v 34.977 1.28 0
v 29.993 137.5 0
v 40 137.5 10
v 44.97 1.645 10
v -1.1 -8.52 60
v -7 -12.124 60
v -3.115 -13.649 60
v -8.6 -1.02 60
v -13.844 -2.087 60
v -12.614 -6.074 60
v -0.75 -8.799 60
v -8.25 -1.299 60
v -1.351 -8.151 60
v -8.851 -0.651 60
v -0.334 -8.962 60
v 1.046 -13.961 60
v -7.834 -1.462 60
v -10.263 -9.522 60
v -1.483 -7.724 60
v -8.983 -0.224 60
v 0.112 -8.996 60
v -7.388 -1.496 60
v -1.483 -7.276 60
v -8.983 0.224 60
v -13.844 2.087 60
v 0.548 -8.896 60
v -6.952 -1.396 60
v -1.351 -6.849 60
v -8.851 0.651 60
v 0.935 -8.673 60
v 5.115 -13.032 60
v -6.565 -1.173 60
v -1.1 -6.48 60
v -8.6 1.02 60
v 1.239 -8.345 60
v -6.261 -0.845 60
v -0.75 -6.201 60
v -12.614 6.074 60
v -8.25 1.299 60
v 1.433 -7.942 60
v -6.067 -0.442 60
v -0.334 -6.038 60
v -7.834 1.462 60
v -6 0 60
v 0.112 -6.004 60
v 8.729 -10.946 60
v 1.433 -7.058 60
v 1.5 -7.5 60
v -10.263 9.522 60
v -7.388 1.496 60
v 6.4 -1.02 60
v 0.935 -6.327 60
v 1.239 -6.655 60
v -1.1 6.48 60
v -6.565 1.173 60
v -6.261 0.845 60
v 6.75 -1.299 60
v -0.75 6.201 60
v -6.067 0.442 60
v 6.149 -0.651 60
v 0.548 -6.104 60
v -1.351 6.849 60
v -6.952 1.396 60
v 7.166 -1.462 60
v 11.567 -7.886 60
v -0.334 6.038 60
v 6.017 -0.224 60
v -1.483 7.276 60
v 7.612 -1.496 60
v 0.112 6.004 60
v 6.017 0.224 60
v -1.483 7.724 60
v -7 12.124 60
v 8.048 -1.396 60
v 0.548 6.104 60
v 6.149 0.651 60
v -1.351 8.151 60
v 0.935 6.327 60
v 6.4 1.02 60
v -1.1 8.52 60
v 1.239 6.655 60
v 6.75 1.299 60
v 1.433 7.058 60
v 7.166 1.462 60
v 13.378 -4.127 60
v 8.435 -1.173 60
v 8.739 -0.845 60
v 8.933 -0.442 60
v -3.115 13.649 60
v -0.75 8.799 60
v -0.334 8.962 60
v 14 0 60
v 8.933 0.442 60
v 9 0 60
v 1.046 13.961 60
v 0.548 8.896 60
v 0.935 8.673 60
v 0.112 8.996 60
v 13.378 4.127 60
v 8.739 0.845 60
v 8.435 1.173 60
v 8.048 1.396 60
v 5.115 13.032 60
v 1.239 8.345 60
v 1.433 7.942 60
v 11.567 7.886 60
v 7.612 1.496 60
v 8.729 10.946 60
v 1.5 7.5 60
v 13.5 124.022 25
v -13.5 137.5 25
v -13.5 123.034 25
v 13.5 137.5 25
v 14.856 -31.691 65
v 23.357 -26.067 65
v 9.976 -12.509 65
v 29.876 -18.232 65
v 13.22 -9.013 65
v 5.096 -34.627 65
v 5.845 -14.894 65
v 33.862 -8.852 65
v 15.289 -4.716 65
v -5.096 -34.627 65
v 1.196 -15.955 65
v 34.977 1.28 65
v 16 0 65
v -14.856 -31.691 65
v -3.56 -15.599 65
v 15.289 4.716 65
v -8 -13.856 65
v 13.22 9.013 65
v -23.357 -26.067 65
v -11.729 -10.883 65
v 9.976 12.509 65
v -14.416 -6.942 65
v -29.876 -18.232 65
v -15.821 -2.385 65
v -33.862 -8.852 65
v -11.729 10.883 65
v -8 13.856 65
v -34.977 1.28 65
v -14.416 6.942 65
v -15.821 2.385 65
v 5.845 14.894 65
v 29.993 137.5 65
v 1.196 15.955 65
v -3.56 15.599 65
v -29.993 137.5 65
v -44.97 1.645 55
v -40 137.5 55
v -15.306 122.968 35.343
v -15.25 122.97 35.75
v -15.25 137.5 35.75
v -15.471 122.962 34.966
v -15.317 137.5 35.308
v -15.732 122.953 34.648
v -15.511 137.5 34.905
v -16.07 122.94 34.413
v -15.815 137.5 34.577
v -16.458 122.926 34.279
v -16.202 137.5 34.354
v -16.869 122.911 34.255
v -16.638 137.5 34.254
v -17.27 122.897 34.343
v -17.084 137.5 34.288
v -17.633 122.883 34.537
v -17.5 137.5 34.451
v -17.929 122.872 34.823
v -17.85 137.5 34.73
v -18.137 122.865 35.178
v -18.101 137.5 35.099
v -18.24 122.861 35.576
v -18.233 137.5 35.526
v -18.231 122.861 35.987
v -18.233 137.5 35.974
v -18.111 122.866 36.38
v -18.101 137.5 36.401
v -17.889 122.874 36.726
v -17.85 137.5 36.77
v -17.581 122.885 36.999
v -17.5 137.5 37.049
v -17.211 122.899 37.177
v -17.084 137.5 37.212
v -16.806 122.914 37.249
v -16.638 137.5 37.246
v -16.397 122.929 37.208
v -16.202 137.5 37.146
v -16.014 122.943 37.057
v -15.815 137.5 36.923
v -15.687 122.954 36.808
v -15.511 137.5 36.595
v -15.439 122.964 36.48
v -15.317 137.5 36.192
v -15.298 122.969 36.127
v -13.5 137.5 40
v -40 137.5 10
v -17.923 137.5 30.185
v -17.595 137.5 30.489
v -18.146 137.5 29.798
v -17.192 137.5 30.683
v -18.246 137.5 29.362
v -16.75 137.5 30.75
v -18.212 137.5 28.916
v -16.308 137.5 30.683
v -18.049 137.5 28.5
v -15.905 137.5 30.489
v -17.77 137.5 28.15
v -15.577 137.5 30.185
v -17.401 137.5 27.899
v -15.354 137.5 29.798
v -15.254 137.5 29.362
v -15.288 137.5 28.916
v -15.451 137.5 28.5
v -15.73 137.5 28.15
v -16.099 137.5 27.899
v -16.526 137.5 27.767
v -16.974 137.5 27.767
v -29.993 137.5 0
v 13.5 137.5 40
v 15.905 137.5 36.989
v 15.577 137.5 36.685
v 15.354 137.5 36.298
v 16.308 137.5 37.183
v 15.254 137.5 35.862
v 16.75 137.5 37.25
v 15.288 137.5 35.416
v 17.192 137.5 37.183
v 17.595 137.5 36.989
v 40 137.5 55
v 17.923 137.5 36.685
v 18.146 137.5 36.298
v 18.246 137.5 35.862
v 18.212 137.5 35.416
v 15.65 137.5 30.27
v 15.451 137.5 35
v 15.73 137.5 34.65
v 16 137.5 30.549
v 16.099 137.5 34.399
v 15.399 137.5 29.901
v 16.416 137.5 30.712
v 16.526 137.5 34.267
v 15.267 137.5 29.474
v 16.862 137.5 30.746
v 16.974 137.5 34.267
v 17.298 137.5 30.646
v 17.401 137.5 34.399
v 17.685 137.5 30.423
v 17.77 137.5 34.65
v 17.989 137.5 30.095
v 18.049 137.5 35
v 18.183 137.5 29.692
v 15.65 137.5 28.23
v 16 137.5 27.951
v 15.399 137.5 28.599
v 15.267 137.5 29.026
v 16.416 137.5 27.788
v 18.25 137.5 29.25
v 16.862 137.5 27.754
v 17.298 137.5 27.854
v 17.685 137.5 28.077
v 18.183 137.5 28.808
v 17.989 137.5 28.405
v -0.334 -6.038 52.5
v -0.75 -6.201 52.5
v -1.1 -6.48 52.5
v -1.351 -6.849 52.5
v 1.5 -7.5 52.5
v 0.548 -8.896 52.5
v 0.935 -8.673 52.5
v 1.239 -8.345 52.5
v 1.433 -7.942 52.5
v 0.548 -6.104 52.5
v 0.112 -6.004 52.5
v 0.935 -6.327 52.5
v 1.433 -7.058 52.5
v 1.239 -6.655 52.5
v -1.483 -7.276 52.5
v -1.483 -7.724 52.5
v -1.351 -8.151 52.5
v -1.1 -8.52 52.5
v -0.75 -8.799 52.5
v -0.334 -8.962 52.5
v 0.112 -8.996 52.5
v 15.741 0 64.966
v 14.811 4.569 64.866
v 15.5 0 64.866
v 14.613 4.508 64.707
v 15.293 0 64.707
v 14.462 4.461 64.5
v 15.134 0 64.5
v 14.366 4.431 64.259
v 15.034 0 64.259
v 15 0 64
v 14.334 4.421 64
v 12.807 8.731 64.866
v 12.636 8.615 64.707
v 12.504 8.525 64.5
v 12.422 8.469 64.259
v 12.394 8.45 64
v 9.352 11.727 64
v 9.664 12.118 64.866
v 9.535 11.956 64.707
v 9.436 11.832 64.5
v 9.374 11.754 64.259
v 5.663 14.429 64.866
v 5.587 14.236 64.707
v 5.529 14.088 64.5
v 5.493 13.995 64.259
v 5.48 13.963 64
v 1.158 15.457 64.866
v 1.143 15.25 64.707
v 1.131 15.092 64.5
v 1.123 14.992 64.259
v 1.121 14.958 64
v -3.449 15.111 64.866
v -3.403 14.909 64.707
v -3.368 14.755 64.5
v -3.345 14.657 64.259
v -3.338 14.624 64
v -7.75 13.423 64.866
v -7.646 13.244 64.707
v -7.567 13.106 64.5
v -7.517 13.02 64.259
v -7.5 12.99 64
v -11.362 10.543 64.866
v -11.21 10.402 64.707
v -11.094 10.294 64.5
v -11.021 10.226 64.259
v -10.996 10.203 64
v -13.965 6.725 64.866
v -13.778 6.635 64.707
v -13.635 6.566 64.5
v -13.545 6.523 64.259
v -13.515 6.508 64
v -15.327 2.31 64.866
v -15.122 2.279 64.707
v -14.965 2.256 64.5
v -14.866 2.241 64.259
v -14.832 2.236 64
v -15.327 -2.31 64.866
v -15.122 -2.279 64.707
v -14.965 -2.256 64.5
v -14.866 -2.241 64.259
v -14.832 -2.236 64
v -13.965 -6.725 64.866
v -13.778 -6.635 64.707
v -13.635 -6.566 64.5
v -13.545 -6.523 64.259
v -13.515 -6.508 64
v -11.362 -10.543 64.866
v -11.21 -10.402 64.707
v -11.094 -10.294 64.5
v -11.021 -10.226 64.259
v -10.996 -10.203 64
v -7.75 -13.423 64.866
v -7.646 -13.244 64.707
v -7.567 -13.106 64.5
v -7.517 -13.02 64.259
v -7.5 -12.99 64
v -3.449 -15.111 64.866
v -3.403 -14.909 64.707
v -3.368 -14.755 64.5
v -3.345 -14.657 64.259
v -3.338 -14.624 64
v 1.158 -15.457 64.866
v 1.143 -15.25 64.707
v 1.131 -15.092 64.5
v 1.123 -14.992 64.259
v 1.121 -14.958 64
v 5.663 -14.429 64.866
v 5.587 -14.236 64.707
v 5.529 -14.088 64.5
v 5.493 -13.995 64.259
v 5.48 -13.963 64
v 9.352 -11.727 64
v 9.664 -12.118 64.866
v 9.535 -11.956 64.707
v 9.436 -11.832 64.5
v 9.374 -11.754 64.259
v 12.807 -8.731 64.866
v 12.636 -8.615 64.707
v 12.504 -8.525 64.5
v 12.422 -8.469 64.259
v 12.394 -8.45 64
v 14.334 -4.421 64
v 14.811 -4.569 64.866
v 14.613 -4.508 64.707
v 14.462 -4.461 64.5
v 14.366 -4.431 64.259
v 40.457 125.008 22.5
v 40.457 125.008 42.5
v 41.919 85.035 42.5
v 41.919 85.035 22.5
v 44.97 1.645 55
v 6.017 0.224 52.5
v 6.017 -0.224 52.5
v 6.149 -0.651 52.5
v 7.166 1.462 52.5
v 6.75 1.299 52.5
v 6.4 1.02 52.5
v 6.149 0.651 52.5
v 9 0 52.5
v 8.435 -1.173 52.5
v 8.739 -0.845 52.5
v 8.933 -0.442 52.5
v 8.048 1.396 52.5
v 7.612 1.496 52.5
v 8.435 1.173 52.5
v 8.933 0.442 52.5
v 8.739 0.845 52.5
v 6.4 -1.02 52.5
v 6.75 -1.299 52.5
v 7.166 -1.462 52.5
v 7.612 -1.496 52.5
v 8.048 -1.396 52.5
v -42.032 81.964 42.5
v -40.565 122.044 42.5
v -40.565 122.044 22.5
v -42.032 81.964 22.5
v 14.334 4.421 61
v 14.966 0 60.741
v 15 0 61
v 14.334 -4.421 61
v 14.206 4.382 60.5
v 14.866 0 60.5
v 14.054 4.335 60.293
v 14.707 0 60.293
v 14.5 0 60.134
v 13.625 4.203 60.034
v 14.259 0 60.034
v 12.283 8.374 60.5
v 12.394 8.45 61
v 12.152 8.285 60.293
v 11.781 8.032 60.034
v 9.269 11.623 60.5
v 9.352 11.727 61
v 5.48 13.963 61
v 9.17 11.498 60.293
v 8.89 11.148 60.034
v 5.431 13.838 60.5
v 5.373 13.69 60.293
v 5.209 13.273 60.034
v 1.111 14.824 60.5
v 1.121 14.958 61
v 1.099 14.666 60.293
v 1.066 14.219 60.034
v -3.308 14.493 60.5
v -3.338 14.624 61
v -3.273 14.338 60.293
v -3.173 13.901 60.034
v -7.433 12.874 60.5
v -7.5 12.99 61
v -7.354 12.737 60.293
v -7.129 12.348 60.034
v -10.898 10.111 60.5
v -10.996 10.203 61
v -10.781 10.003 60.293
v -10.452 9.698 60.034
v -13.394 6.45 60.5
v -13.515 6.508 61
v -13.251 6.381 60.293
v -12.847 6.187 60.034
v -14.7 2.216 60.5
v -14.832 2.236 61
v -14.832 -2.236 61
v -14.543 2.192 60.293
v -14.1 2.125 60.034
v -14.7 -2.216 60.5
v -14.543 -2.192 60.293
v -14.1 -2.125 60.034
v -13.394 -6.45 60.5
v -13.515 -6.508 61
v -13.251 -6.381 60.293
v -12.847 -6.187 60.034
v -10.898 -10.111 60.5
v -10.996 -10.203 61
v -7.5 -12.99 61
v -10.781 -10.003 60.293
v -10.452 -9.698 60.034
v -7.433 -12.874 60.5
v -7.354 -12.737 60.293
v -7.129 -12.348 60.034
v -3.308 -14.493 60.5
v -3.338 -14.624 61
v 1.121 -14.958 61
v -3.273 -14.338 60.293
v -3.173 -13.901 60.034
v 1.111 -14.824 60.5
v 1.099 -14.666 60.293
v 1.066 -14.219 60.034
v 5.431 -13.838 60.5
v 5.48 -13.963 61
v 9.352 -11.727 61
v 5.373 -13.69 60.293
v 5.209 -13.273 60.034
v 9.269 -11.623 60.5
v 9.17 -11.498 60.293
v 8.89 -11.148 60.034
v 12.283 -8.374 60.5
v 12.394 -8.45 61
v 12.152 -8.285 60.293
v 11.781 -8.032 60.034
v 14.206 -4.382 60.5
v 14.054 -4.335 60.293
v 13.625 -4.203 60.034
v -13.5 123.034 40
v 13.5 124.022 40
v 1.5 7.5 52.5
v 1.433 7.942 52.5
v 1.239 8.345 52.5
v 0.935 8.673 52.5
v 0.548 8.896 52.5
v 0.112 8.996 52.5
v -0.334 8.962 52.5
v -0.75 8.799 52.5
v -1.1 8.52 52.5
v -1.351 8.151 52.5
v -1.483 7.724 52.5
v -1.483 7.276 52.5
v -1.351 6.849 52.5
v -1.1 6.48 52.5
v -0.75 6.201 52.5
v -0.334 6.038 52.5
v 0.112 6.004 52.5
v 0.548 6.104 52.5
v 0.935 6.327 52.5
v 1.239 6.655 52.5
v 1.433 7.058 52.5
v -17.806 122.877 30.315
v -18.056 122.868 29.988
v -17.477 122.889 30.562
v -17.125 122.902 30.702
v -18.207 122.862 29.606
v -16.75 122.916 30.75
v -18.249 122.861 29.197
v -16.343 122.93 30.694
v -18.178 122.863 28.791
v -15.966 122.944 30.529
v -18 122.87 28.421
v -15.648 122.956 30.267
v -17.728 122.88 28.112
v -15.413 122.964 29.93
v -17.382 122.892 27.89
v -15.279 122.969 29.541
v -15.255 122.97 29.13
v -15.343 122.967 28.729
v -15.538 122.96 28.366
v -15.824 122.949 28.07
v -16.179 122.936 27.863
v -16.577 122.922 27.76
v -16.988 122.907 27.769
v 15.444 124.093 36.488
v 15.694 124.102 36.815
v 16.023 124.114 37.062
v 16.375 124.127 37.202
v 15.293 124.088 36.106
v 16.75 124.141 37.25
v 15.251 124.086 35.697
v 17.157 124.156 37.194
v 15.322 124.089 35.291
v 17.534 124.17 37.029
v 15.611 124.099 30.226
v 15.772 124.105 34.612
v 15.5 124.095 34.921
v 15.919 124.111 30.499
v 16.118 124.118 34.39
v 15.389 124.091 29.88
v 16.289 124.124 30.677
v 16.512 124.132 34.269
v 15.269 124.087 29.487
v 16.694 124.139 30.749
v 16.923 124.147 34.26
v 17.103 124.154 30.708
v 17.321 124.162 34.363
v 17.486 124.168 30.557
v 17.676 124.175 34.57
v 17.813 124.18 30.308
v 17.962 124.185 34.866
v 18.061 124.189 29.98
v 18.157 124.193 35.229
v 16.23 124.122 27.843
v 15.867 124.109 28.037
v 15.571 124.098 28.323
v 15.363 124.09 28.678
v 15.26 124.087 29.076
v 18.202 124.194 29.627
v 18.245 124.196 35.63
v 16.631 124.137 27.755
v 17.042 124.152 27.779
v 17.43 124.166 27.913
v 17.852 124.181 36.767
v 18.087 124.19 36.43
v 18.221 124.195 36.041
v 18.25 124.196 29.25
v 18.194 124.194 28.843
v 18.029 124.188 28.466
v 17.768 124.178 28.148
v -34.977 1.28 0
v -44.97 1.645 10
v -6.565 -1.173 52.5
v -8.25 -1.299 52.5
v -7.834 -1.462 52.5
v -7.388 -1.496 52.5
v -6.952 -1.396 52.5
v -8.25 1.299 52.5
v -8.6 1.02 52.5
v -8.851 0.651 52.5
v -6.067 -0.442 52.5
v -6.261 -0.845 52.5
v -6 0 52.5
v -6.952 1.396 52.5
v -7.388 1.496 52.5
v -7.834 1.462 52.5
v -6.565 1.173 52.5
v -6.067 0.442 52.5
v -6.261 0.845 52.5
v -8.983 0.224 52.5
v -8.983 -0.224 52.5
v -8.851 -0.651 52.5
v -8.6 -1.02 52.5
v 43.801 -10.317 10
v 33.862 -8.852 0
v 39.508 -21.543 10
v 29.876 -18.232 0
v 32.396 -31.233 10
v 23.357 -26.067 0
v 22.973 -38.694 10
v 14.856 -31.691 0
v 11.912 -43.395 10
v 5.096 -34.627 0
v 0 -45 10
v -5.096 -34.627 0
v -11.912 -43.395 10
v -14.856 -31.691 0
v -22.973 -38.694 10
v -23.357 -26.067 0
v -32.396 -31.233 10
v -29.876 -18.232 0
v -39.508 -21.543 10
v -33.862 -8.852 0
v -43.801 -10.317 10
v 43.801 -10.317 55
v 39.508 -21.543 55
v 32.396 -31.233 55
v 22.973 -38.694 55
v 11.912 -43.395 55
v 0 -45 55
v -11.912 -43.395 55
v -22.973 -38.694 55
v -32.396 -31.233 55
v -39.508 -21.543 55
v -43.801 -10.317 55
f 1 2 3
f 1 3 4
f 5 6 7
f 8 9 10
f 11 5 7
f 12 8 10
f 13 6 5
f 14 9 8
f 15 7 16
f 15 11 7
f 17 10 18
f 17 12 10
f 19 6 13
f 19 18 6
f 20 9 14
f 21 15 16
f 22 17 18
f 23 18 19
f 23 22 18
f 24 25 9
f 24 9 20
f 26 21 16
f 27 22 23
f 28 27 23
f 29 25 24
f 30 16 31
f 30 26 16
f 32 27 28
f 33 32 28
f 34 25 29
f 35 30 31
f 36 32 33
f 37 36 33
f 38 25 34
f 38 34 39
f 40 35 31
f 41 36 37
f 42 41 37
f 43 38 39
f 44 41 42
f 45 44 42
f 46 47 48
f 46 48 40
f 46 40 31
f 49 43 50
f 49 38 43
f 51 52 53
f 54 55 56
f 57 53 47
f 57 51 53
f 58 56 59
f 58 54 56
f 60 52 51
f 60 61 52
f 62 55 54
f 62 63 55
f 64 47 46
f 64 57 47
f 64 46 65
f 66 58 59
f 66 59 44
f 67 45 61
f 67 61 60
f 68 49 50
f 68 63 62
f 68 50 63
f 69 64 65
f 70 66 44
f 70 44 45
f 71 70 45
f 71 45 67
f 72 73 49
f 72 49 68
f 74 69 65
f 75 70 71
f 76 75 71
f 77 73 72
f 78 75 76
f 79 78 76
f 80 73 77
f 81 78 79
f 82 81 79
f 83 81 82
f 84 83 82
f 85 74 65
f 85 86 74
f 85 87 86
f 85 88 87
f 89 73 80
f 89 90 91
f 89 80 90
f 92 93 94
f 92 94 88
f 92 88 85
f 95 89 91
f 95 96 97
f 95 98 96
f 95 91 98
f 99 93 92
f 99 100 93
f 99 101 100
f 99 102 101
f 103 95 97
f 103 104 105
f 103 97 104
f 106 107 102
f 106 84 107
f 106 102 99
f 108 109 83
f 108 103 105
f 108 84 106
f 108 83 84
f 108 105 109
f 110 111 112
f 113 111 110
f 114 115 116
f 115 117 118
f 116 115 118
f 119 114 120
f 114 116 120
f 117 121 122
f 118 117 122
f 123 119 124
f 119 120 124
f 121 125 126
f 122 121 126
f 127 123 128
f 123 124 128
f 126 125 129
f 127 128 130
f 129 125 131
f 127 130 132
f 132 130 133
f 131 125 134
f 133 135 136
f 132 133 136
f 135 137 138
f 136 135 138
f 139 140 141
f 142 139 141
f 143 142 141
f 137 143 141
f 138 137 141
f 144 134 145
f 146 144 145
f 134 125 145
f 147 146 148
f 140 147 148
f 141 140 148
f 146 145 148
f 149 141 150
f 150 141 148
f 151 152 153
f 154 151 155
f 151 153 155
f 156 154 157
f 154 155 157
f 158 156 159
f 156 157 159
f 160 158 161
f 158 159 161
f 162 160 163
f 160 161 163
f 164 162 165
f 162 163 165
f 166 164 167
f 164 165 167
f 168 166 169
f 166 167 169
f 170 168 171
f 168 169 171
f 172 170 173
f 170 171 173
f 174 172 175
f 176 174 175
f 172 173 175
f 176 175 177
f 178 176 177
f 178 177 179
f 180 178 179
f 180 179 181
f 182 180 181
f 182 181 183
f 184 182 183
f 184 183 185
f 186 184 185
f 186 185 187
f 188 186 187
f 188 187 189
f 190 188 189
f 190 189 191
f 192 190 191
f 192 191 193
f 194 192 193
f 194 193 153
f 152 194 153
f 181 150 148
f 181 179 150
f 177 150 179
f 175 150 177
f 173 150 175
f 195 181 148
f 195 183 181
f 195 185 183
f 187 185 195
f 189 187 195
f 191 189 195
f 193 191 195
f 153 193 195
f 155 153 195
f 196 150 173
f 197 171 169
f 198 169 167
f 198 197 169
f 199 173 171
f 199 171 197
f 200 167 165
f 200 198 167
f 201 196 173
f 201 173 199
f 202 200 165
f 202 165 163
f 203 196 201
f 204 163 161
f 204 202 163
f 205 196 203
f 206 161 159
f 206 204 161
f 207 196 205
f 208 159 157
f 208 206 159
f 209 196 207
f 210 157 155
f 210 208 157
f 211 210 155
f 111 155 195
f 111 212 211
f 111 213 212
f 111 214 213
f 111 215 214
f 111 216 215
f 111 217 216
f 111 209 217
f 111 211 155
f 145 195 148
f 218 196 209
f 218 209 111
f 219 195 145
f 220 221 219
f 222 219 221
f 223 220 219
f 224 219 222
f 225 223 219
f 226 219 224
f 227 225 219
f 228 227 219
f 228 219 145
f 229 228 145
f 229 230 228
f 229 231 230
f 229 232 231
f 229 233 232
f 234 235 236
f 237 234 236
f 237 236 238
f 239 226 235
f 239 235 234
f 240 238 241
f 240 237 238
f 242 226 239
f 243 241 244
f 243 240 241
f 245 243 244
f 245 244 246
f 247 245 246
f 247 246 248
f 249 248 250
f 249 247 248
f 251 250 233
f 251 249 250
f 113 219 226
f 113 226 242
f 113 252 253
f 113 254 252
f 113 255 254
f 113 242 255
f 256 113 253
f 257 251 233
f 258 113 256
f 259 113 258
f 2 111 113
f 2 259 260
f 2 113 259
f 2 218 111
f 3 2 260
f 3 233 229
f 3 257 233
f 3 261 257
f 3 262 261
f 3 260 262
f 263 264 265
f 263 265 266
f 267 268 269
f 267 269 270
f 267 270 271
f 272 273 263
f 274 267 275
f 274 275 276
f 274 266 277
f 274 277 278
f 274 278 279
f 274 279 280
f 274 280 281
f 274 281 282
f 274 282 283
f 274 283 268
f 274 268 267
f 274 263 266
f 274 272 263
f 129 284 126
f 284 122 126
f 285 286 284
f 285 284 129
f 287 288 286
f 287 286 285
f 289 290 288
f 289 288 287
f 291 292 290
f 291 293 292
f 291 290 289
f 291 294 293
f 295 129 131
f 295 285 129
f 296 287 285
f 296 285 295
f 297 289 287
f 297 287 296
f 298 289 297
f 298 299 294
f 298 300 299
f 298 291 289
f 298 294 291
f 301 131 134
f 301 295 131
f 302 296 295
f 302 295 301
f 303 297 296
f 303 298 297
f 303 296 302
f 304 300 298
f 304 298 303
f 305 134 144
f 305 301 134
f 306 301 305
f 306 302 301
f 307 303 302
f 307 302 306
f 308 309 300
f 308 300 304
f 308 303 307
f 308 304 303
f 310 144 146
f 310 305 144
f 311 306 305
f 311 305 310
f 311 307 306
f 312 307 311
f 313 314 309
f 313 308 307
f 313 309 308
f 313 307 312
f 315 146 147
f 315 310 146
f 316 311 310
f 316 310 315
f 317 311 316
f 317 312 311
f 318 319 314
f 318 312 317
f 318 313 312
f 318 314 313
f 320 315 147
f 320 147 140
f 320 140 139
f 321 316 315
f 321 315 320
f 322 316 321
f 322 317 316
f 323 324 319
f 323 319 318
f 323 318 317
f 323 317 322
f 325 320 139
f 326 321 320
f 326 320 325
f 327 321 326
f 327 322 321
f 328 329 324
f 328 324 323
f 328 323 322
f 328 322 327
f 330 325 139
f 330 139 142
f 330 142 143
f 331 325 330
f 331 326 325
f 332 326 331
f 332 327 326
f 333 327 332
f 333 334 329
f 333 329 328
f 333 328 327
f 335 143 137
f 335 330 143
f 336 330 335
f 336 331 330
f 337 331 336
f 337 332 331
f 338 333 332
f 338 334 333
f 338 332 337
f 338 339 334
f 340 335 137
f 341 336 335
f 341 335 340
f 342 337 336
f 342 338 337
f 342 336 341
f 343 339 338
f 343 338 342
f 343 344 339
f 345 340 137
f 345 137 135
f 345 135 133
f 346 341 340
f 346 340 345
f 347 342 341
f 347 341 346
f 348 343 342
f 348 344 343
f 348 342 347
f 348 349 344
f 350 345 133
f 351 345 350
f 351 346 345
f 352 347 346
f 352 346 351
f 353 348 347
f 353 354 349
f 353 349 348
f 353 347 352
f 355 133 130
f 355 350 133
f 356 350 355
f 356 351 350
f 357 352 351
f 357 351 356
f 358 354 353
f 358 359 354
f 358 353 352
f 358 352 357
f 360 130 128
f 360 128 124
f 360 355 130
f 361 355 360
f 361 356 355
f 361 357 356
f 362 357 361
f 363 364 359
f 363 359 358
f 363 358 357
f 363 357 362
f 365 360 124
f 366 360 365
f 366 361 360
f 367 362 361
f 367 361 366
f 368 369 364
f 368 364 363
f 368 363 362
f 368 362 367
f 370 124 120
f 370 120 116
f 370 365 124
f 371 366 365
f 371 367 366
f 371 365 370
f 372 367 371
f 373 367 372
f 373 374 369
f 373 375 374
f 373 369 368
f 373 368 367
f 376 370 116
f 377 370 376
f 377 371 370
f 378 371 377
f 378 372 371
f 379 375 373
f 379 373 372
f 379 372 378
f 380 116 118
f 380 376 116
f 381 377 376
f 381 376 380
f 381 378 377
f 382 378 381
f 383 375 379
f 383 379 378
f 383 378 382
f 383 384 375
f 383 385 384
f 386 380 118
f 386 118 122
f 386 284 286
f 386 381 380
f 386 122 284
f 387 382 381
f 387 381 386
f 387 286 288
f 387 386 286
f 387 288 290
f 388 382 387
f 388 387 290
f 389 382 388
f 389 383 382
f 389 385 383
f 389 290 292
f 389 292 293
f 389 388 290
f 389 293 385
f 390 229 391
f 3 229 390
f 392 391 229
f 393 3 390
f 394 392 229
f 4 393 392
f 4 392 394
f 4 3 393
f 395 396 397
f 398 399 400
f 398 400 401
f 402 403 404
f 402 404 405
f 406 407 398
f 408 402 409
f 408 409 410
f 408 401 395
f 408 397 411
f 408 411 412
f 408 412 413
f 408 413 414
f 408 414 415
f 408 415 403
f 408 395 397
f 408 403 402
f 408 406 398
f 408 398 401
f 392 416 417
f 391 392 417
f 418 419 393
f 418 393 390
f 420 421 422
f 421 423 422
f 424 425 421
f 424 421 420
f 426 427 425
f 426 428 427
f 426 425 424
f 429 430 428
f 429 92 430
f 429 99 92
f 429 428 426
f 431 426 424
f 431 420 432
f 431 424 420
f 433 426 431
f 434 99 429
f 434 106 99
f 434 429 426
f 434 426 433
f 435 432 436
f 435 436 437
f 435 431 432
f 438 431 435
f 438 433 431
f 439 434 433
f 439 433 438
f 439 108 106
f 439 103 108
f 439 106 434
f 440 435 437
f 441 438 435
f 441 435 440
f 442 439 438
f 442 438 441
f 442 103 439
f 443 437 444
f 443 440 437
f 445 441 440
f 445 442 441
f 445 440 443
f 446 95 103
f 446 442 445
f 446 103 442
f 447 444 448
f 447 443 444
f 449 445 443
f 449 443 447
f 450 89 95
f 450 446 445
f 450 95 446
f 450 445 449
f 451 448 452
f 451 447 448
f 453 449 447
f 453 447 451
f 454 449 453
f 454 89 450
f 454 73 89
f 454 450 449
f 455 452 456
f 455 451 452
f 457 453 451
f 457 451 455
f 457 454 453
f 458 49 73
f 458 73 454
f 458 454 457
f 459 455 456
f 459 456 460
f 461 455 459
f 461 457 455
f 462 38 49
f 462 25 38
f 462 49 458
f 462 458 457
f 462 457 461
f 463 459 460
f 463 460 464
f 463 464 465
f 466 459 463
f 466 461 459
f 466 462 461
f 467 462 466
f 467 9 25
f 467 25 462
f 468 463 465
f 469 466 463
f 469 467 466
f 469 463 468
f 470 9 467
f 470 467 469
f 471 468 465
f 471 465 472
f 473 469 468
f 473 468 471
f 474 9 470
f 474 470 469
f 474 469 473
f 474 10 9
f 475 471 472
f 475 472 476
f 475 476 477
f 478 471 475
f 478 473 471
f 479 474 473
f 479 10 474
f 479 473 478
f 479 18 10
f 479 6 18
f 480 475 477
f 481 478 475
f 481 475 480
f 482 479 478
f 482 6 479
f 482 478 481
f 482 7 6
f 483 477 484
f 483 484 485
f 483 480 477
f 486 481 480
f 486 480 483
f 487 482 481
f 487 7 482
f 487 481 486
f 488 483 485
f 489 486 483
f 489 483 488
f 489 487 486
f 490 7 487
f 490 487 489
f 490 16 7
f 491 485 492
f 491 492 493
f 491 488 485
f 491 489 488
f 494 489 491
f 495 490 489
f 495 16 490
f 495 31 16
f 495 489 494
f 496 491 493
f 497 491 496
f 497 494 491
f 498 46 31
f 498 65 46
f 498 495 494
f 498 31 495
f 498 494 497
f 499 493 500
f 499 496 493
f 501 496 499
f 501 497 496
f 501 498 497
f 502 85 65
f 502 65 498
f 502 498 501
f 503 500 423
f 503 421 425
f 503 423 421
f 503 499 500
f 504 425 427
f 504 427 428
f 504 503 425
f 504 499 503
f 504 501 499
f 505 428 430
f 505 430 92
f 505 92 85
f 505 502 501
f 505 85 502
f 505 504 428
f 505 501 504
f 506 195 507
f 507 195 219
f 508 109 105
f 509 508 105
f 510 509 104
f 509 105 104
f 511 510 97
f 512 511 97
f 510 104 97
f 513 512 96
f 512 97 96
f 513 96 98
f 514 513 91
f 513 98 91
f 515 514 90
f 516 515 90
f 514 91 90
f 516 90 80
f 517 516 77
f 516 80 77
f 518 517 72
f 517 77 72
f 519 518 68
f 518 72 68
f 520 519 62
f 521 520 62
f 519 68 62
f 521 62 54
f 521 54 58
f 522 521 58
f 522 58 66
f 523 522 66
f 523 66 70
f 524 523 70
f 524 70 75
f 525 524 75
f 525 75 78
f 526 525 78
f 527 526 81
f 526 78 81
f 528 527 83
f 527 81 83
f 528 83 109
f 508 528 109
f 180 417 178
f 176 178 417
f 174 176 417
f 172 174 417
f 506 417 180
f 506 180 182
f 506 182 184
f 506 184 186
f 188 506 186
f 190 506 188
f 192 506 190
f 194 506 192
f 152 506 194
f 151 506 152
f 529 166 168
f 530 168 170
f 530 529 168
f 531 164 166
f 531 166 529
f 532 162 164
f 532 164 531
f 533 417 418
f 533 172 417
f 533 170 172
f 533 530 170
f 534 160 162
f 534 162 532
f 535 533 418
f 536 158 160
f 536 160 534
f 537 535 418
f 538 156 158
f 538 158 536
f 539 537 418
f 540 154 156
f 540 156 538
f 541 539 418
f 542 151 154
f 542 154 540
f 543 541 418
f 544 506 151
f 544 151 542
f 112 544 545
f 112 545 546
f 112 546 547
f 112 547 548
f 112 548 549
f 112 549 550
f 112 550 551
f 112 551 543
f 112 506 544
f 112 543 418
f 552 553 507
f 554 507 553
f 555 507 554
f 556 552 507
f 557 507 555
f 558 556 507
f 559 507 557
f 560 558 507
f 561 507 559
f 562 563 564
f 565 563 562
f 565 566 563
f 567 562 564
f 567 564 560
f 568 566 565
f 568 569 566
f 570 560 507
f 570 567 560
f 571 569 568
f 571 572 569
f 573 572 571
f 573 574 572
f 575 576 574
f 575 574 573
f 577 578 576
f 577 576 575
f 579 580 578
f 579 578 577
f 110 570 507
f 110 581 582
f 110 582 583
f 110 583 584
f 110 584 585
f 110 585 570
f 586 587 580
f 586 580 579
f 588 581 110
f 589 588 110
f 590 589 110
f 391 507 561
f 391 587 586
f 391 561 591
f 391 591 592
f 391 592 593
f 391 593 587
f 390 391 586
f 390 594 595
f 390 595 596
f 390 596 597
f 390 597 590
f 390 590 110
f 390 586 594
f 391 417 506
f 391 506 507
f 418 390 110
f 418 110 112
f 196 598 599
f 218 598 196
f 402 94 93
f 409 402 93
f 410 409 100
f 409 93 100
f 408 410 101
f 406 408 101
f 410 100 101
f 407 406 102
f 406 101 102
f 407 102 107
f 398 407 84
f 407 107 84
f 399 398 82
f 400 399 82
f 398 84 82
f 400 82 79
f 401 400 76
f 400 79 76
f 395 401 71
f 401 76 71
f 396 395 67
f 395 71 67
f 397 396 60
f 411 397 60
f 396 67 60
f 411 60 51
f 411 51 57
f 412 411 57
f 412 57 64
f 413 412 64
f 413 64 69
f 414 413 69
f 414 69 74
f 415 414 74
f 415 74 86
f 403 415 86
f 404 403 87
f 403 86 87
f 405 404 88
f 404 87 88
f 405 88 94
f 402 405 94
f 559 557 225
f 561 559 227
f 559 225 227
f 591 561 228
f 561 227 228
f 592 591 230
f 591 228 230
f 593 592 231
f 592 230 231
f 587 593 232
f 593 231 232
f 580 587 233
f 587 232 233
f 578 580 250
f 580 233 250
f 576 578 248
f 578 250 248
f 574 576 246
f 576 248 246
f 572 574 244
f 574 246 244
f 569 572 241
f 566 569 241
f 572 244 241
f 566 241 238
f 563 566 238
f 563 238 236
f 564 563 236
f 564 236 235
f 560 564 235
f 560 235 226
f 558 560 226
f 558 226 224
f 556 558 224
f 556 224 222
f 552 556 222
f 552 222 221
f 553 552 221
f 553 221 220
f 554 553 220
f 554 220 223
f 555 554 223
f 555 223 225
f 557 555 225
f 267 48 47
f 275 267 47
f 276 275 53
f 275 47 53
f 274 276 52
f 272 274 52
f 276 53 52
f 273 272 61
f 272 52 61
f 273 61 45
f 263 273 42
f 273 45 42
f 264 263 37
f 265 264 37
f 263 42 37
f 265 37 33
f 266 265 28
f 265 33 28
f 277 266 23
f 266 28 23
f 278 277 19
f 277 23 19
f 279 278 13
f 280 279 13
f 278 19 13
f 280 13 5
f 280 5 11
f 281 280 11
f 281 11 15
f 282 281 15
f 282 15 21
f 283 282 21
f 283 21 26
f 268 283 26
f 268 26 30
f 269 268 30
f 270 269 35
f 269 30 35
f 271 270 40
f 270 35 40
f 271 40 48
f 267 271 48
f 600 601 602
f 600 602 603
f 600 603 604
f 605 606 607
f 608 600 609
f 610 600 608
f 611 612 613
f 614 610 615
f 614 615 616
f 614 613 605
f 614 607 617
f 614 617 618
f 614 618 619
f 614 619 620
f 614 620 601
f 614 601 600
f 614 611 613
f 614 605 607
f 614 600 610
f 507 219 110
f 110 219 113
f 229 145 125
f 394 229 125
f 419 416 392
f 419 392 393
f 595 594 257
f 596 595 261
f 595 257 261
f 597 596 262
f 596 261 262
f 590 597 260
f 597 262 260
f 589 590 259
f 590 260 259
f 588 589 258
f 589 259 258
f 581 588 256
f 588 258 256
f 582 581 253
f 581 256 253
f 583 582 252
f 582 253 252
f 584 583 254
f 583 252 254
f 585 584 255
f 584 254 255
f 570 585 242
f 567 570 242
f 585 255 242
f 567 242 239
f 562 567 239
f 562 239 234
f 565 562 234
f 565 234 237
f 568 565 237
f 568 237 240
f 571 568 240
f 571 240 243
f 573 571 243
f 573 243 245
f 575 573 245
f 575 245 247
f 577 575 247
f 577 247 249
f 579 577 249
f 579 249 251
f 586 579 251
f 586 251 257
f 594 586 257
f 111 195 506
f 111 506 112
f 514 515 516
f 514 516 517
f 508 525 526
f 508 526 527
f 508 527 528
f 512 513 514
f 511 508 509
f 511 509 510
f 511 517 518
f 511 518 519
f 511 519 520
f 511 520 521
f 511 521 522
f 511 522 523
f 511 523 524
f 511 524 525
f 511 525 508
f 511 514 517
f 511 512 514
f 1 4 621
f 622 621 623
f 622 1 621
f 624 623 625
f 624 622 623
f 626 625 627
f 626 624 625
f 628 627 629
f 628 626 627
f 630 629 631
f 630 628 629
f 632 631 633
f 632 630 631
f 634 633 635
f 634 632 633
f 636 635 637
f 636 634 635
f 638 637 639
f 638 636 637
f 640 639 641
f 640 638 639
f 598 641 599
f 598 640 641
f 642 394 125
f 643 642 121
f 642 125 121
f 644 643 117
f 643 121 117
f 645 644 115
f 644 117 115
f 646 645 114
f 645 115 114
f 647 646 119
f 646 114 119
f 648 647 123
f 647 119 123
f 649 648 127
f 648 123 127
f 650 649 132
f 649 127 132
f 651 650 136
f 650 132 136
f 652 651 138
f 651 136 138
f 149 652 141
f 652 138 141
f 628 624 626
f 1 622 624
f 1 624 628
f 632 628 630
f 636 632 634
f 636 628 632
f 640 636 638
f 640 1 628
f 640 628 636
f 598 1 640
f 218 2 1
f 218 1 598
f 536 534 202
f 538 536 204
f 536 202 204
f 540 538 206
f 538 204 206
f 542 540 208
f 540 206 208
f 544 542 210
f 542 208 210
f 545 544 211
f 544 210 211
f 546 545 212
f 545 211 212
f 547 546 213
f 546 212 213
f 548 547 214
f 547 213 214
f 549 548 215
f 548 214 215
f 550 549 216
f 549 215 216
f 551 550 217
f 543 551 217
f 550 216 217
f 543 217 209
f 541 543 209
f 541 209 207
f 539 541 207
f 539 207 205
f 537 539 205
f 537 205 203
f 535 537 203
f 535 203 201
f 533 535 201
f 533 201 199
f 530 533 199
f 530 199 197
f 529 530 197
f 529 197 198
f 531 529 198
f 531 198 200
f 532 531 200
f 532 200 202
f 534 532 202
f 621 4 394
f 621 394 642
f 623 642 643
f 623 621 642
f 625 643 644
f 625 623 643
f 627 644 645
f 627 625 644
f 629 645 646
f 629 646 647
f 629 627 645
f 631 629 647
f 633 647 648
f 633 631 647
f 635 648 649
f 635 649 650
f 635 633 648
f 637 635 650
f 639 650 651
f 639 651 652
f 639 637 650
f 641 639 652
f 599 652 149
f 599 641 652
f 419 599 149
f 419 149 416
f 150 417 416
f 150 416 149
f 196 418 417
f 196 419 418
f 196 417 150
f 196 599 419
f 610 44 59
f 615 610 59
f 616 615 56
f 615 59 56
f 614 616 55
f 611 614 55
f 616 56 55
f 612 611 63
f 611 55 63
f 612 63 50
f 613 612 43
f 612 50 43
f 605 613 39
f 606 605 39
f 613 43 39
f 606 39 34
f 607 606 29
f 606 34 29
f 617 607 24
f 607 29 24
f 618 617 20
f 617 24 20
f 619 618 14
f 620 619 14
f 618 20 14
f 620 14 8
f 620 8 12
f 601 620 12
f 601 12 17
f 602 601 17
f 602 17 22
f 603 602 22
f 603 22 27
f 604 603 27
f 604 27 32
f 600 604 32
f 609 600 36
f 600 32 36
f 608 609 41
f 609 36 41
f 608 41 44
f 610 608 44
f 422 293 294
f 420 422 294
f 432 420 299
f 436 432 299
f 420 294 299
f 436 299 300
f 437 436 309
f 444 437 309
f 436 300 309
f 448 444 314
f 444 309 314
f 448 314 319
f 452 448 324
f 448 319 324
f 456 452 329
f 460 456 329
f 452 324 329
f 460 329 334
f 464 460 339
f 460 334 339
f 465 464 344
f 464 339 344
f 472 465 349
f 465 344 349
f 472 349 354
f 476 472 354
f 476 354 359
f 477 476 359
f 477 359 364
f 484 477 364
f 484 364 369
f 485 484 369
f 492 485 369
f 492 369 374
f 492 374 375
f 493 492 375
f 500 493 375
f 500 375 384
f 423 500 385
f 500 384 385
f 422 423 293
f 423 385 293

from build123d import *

# Parameters (mm, degrees)
BOSS_EXTRUDE1_DEPTH = 65
CHAMFER2_SIZE       = 10
SKETCH2_R           = 15
CUT_EXTRUDE1_DEPTH  = 5
SKETCH3_R           = 1.5
CUT_EXTRUDE2_DEPTH  = 7.5
FILLET1_R           = 1
SKETCH4_W           = 20
SKETCH4_H           = 40
CUT_EXTRUDE3_DEPTH  = 176.431286259
CUT_EXTRUDE5_REACH  = 200.888
SKETCH5_R           = 1.5
SKETCH5_W           = 27
SKETCH5_H           = 15


with BuildPart() as part:
    # Sketch1 → Boss-Extrude1 (new body)
    with BuildSketch(Plane.XY):
        with BuildLine():
            Line((-40, 137.5), (40, 137.5))
            Line((40, 137.5), (44.969918815, 1.645114527))
            ThreePointArc((44.969918815, 1.645114527), (0, -45), (-44.969918815, 1.645114527))
            Line((-44.969918815, 1.645114527), (-40, 137.5))
        make_face()
    extrude(amount=BOSS_EXTRUDE1_DEPTH)

    # Chamfer2
    chamfer2_edges = [part.edges().sort_by_distance(p)[0] for p in [
        (-42.484959407, 69.572557263, 65),
        (0, -45, 65),
        (-42.484959407, 69.572557263, 0),
        (42.484959407, 69.572557263, 0),
        (0, -45, 0),
        (42.484959407, 69.572557263, 65),
    ]]
    chamfer(chamfer2_edges, length=CHAMFER2_SIZE)

    # Sketch2 → Cut-Extrude1 (cut)
    with BuildSketch(Plane.XY.offset(65)):
        Circle(SKETCH2_R)
    extrude(amount=-CUT_EXTRUDE1_DEPTH, mode=Mode.SUBTRACT)

    # Sketch3 → Cut-Extrude2 (cut)
    with BuildSketch(Plane.XY.offset(60)):
        with Locations((0, 7.5)):
            Circle(SKETCH3_R)
        with Locations((7.5, 0)):
            Circle(SKETCH3_R)
        with Locations((0, -7.5)):
            Circle(SKETCH3_R)
        with Locations((-7.5, 0)):
            Circle(SKETCH3_R)
    extrude(amount=-CUT_EXTRUDE2_DEPTH, mode=Mode.SUBTRACT)

    # Fillet1
    fillet1_edges = [part.edges().sort_by_distance(p)[0] for p in [
        (-15, 0, 60),
        (-15, 0, 65),
    ]]
    fillet(fillet1_edges, radius=FILLET1_R)

    # Sketch4 → Cut-Extrude3 (cut, through all)
    with BuildSketch(Plane(origin=(44.969918815, 1.645114527, 0), x_dir=(0, 0, -1), z_dir=(0.9993315292139455, 0.03655810059230684, 0))):
        with Locations((-32.5, 103.445761243)):
            Rectangle(SKETCH4_W, SKETCH4_H)
    extrude(amount=-CUT_EXTRUDE3_DEPTH, mode=Mode.SUBTRACT)

    # Cut-Extrude5: up to this plane
    cut_extrude5_end = Plane(origin=(-51.096815111, 121.65908428, 42.5), z_dir=(-0.036558100592306846, 0.9993315292139455, 0))
    # Sketch5 → Cut-Extrude5 (cut, up to the surface)
    with BuildSketch(Plane(origin=(0, 137.5, 0), x_dir=(1, 0, 0), z_dir=(0, 1, 0)), mode=Mode.PRIVATE) as cut_extrude5_sk1:
        with Locations(Location((-16.75, -29.25, 0), (0, 0, 270))):
            Circle(SKETCH5_R)
    cut_extrude5_tool1 = split(extrude(cut_extrude5_sk1.sketch, amount=-CUT_EXTRUDE5_REACH, mode=Mode.PRIVATE), bisect_by=cut_extrude5_end, keep=Keep.BOTH, mode=Mode.PRIVATE)
    add(cut_extrude5_tool1.solids().sort_by_distance((-16.75, 137.5, 29.25))[0], mode=Mode.SUBTRACT)
    # Sketch5 → Cut-Extrude5 (cut, up to the surface)
    with BuildSketch(Plane(origin=(0, 137.5, 0), x_dir=(1, 0, 0), z_dir=(0, 1, 0)), mode=Mode.PRIVATE) as cut_extrude5_sk2:
        with Locations((-16.75, -35.75)):
            Circle(SKETCH5_R)
    cut_extrude5_tool2 = split(extrude(cut_extrude5_sk2.sketch, amount=-CUT_EXTRUDE5_REACH, mode=Mode.PRIVATE), bisect_by=cut_extrude5_end, keep=Keep.BOTH, mode=Mode.PRIVATE)
    add(cut_extrude5_tool2.solids().sort_by_distance((-16.75, 137.5, 35.75))[0], mode=Mode.SUBTRACT)
    # Sketch5 → Cut-Extrude5 (cut, up to the surface)
    with BuildSketch(Plane(origin=(0, 137.5, 0), x_dir=(1, 0, 0), z_dir=(0, 1, 0)), mode=Mode.PRIVATE) as cut_extrude5_sk3:
        with Locations(Location((16.75, -35.75, 0), (0, 0, 270))):
            Circle(SKETCH5_R)
    cut_extrude5_tool3 = split(extrude(cut_extrude5_sk3.sketch, amount=-CUT_EXTRUDE5_REACH, mode=Mode.PRIVATE), bisect_by=cut_extrude5_end, keep=Keep.BOTH, mode=Mode.PRIVATE)
    add(cut_extrude5_tool3.solids().sort_by_distance((16.75, 137.5, 35.75))[0], mode=Mode.SUBTRACT)
    # Sketch5 → Cut-Extrude5 (cut, up to the surface)
    with BuildSketch(Plane(origin=(0, 137.5, 0), x_dir=(1, 0, 0), z_dir=(0, 1, 0)), mode=Mode.PRIVATE) as cut_extrude5_sk4:
        with Locations((16.75, -29.25)):
            Circle(SKETCH5_R)
    cut_extrude5_tool4 = split(extrude(cut_extrude5_sk4.sketch, amount=-CUT_EXTRUDE5_REACH, mode=Mode.PRIVATE), bisect_by=cut_extrude5_end, keep=Keep.BOTH, mode=Mode.PRIVATE)
    add(cut_extrude5_tool4.solids().sort_by_distance((16.75, 137.5, 29.25))[0], mode=Mode.SUBTRACT)
    # Sketch5 → Cut-Extrude5 (cut, up to the surface)
    with BuildSketch(Plane(origin=(0, 137.5, 0), x_dir=(1, 0, 0), z_dir=(0, 1, 0)), mode=Mode.PRIVATE) as cut_extrude5_sk5:
        with Locations((0, -32.5)):
            Rectangle(SKETCH5_W, SKETCH5_H)
    cut_extrude5_tool5 = split(extrude(cut_extrude5_sk5.sketch, amount=-CUT_EXTRUDE5_REACH, mode=Mode.PRIVATE), bisect_by=cut_extrude5_end, keep=Keep.BOTH, mode=Mode.PRIVATE)
    add(cut_extrude5_tool5.solids().sort_by_distance((0, 137.5, 32.5))[0], mode=Mode.SUBTRACT)


solid = part.part
